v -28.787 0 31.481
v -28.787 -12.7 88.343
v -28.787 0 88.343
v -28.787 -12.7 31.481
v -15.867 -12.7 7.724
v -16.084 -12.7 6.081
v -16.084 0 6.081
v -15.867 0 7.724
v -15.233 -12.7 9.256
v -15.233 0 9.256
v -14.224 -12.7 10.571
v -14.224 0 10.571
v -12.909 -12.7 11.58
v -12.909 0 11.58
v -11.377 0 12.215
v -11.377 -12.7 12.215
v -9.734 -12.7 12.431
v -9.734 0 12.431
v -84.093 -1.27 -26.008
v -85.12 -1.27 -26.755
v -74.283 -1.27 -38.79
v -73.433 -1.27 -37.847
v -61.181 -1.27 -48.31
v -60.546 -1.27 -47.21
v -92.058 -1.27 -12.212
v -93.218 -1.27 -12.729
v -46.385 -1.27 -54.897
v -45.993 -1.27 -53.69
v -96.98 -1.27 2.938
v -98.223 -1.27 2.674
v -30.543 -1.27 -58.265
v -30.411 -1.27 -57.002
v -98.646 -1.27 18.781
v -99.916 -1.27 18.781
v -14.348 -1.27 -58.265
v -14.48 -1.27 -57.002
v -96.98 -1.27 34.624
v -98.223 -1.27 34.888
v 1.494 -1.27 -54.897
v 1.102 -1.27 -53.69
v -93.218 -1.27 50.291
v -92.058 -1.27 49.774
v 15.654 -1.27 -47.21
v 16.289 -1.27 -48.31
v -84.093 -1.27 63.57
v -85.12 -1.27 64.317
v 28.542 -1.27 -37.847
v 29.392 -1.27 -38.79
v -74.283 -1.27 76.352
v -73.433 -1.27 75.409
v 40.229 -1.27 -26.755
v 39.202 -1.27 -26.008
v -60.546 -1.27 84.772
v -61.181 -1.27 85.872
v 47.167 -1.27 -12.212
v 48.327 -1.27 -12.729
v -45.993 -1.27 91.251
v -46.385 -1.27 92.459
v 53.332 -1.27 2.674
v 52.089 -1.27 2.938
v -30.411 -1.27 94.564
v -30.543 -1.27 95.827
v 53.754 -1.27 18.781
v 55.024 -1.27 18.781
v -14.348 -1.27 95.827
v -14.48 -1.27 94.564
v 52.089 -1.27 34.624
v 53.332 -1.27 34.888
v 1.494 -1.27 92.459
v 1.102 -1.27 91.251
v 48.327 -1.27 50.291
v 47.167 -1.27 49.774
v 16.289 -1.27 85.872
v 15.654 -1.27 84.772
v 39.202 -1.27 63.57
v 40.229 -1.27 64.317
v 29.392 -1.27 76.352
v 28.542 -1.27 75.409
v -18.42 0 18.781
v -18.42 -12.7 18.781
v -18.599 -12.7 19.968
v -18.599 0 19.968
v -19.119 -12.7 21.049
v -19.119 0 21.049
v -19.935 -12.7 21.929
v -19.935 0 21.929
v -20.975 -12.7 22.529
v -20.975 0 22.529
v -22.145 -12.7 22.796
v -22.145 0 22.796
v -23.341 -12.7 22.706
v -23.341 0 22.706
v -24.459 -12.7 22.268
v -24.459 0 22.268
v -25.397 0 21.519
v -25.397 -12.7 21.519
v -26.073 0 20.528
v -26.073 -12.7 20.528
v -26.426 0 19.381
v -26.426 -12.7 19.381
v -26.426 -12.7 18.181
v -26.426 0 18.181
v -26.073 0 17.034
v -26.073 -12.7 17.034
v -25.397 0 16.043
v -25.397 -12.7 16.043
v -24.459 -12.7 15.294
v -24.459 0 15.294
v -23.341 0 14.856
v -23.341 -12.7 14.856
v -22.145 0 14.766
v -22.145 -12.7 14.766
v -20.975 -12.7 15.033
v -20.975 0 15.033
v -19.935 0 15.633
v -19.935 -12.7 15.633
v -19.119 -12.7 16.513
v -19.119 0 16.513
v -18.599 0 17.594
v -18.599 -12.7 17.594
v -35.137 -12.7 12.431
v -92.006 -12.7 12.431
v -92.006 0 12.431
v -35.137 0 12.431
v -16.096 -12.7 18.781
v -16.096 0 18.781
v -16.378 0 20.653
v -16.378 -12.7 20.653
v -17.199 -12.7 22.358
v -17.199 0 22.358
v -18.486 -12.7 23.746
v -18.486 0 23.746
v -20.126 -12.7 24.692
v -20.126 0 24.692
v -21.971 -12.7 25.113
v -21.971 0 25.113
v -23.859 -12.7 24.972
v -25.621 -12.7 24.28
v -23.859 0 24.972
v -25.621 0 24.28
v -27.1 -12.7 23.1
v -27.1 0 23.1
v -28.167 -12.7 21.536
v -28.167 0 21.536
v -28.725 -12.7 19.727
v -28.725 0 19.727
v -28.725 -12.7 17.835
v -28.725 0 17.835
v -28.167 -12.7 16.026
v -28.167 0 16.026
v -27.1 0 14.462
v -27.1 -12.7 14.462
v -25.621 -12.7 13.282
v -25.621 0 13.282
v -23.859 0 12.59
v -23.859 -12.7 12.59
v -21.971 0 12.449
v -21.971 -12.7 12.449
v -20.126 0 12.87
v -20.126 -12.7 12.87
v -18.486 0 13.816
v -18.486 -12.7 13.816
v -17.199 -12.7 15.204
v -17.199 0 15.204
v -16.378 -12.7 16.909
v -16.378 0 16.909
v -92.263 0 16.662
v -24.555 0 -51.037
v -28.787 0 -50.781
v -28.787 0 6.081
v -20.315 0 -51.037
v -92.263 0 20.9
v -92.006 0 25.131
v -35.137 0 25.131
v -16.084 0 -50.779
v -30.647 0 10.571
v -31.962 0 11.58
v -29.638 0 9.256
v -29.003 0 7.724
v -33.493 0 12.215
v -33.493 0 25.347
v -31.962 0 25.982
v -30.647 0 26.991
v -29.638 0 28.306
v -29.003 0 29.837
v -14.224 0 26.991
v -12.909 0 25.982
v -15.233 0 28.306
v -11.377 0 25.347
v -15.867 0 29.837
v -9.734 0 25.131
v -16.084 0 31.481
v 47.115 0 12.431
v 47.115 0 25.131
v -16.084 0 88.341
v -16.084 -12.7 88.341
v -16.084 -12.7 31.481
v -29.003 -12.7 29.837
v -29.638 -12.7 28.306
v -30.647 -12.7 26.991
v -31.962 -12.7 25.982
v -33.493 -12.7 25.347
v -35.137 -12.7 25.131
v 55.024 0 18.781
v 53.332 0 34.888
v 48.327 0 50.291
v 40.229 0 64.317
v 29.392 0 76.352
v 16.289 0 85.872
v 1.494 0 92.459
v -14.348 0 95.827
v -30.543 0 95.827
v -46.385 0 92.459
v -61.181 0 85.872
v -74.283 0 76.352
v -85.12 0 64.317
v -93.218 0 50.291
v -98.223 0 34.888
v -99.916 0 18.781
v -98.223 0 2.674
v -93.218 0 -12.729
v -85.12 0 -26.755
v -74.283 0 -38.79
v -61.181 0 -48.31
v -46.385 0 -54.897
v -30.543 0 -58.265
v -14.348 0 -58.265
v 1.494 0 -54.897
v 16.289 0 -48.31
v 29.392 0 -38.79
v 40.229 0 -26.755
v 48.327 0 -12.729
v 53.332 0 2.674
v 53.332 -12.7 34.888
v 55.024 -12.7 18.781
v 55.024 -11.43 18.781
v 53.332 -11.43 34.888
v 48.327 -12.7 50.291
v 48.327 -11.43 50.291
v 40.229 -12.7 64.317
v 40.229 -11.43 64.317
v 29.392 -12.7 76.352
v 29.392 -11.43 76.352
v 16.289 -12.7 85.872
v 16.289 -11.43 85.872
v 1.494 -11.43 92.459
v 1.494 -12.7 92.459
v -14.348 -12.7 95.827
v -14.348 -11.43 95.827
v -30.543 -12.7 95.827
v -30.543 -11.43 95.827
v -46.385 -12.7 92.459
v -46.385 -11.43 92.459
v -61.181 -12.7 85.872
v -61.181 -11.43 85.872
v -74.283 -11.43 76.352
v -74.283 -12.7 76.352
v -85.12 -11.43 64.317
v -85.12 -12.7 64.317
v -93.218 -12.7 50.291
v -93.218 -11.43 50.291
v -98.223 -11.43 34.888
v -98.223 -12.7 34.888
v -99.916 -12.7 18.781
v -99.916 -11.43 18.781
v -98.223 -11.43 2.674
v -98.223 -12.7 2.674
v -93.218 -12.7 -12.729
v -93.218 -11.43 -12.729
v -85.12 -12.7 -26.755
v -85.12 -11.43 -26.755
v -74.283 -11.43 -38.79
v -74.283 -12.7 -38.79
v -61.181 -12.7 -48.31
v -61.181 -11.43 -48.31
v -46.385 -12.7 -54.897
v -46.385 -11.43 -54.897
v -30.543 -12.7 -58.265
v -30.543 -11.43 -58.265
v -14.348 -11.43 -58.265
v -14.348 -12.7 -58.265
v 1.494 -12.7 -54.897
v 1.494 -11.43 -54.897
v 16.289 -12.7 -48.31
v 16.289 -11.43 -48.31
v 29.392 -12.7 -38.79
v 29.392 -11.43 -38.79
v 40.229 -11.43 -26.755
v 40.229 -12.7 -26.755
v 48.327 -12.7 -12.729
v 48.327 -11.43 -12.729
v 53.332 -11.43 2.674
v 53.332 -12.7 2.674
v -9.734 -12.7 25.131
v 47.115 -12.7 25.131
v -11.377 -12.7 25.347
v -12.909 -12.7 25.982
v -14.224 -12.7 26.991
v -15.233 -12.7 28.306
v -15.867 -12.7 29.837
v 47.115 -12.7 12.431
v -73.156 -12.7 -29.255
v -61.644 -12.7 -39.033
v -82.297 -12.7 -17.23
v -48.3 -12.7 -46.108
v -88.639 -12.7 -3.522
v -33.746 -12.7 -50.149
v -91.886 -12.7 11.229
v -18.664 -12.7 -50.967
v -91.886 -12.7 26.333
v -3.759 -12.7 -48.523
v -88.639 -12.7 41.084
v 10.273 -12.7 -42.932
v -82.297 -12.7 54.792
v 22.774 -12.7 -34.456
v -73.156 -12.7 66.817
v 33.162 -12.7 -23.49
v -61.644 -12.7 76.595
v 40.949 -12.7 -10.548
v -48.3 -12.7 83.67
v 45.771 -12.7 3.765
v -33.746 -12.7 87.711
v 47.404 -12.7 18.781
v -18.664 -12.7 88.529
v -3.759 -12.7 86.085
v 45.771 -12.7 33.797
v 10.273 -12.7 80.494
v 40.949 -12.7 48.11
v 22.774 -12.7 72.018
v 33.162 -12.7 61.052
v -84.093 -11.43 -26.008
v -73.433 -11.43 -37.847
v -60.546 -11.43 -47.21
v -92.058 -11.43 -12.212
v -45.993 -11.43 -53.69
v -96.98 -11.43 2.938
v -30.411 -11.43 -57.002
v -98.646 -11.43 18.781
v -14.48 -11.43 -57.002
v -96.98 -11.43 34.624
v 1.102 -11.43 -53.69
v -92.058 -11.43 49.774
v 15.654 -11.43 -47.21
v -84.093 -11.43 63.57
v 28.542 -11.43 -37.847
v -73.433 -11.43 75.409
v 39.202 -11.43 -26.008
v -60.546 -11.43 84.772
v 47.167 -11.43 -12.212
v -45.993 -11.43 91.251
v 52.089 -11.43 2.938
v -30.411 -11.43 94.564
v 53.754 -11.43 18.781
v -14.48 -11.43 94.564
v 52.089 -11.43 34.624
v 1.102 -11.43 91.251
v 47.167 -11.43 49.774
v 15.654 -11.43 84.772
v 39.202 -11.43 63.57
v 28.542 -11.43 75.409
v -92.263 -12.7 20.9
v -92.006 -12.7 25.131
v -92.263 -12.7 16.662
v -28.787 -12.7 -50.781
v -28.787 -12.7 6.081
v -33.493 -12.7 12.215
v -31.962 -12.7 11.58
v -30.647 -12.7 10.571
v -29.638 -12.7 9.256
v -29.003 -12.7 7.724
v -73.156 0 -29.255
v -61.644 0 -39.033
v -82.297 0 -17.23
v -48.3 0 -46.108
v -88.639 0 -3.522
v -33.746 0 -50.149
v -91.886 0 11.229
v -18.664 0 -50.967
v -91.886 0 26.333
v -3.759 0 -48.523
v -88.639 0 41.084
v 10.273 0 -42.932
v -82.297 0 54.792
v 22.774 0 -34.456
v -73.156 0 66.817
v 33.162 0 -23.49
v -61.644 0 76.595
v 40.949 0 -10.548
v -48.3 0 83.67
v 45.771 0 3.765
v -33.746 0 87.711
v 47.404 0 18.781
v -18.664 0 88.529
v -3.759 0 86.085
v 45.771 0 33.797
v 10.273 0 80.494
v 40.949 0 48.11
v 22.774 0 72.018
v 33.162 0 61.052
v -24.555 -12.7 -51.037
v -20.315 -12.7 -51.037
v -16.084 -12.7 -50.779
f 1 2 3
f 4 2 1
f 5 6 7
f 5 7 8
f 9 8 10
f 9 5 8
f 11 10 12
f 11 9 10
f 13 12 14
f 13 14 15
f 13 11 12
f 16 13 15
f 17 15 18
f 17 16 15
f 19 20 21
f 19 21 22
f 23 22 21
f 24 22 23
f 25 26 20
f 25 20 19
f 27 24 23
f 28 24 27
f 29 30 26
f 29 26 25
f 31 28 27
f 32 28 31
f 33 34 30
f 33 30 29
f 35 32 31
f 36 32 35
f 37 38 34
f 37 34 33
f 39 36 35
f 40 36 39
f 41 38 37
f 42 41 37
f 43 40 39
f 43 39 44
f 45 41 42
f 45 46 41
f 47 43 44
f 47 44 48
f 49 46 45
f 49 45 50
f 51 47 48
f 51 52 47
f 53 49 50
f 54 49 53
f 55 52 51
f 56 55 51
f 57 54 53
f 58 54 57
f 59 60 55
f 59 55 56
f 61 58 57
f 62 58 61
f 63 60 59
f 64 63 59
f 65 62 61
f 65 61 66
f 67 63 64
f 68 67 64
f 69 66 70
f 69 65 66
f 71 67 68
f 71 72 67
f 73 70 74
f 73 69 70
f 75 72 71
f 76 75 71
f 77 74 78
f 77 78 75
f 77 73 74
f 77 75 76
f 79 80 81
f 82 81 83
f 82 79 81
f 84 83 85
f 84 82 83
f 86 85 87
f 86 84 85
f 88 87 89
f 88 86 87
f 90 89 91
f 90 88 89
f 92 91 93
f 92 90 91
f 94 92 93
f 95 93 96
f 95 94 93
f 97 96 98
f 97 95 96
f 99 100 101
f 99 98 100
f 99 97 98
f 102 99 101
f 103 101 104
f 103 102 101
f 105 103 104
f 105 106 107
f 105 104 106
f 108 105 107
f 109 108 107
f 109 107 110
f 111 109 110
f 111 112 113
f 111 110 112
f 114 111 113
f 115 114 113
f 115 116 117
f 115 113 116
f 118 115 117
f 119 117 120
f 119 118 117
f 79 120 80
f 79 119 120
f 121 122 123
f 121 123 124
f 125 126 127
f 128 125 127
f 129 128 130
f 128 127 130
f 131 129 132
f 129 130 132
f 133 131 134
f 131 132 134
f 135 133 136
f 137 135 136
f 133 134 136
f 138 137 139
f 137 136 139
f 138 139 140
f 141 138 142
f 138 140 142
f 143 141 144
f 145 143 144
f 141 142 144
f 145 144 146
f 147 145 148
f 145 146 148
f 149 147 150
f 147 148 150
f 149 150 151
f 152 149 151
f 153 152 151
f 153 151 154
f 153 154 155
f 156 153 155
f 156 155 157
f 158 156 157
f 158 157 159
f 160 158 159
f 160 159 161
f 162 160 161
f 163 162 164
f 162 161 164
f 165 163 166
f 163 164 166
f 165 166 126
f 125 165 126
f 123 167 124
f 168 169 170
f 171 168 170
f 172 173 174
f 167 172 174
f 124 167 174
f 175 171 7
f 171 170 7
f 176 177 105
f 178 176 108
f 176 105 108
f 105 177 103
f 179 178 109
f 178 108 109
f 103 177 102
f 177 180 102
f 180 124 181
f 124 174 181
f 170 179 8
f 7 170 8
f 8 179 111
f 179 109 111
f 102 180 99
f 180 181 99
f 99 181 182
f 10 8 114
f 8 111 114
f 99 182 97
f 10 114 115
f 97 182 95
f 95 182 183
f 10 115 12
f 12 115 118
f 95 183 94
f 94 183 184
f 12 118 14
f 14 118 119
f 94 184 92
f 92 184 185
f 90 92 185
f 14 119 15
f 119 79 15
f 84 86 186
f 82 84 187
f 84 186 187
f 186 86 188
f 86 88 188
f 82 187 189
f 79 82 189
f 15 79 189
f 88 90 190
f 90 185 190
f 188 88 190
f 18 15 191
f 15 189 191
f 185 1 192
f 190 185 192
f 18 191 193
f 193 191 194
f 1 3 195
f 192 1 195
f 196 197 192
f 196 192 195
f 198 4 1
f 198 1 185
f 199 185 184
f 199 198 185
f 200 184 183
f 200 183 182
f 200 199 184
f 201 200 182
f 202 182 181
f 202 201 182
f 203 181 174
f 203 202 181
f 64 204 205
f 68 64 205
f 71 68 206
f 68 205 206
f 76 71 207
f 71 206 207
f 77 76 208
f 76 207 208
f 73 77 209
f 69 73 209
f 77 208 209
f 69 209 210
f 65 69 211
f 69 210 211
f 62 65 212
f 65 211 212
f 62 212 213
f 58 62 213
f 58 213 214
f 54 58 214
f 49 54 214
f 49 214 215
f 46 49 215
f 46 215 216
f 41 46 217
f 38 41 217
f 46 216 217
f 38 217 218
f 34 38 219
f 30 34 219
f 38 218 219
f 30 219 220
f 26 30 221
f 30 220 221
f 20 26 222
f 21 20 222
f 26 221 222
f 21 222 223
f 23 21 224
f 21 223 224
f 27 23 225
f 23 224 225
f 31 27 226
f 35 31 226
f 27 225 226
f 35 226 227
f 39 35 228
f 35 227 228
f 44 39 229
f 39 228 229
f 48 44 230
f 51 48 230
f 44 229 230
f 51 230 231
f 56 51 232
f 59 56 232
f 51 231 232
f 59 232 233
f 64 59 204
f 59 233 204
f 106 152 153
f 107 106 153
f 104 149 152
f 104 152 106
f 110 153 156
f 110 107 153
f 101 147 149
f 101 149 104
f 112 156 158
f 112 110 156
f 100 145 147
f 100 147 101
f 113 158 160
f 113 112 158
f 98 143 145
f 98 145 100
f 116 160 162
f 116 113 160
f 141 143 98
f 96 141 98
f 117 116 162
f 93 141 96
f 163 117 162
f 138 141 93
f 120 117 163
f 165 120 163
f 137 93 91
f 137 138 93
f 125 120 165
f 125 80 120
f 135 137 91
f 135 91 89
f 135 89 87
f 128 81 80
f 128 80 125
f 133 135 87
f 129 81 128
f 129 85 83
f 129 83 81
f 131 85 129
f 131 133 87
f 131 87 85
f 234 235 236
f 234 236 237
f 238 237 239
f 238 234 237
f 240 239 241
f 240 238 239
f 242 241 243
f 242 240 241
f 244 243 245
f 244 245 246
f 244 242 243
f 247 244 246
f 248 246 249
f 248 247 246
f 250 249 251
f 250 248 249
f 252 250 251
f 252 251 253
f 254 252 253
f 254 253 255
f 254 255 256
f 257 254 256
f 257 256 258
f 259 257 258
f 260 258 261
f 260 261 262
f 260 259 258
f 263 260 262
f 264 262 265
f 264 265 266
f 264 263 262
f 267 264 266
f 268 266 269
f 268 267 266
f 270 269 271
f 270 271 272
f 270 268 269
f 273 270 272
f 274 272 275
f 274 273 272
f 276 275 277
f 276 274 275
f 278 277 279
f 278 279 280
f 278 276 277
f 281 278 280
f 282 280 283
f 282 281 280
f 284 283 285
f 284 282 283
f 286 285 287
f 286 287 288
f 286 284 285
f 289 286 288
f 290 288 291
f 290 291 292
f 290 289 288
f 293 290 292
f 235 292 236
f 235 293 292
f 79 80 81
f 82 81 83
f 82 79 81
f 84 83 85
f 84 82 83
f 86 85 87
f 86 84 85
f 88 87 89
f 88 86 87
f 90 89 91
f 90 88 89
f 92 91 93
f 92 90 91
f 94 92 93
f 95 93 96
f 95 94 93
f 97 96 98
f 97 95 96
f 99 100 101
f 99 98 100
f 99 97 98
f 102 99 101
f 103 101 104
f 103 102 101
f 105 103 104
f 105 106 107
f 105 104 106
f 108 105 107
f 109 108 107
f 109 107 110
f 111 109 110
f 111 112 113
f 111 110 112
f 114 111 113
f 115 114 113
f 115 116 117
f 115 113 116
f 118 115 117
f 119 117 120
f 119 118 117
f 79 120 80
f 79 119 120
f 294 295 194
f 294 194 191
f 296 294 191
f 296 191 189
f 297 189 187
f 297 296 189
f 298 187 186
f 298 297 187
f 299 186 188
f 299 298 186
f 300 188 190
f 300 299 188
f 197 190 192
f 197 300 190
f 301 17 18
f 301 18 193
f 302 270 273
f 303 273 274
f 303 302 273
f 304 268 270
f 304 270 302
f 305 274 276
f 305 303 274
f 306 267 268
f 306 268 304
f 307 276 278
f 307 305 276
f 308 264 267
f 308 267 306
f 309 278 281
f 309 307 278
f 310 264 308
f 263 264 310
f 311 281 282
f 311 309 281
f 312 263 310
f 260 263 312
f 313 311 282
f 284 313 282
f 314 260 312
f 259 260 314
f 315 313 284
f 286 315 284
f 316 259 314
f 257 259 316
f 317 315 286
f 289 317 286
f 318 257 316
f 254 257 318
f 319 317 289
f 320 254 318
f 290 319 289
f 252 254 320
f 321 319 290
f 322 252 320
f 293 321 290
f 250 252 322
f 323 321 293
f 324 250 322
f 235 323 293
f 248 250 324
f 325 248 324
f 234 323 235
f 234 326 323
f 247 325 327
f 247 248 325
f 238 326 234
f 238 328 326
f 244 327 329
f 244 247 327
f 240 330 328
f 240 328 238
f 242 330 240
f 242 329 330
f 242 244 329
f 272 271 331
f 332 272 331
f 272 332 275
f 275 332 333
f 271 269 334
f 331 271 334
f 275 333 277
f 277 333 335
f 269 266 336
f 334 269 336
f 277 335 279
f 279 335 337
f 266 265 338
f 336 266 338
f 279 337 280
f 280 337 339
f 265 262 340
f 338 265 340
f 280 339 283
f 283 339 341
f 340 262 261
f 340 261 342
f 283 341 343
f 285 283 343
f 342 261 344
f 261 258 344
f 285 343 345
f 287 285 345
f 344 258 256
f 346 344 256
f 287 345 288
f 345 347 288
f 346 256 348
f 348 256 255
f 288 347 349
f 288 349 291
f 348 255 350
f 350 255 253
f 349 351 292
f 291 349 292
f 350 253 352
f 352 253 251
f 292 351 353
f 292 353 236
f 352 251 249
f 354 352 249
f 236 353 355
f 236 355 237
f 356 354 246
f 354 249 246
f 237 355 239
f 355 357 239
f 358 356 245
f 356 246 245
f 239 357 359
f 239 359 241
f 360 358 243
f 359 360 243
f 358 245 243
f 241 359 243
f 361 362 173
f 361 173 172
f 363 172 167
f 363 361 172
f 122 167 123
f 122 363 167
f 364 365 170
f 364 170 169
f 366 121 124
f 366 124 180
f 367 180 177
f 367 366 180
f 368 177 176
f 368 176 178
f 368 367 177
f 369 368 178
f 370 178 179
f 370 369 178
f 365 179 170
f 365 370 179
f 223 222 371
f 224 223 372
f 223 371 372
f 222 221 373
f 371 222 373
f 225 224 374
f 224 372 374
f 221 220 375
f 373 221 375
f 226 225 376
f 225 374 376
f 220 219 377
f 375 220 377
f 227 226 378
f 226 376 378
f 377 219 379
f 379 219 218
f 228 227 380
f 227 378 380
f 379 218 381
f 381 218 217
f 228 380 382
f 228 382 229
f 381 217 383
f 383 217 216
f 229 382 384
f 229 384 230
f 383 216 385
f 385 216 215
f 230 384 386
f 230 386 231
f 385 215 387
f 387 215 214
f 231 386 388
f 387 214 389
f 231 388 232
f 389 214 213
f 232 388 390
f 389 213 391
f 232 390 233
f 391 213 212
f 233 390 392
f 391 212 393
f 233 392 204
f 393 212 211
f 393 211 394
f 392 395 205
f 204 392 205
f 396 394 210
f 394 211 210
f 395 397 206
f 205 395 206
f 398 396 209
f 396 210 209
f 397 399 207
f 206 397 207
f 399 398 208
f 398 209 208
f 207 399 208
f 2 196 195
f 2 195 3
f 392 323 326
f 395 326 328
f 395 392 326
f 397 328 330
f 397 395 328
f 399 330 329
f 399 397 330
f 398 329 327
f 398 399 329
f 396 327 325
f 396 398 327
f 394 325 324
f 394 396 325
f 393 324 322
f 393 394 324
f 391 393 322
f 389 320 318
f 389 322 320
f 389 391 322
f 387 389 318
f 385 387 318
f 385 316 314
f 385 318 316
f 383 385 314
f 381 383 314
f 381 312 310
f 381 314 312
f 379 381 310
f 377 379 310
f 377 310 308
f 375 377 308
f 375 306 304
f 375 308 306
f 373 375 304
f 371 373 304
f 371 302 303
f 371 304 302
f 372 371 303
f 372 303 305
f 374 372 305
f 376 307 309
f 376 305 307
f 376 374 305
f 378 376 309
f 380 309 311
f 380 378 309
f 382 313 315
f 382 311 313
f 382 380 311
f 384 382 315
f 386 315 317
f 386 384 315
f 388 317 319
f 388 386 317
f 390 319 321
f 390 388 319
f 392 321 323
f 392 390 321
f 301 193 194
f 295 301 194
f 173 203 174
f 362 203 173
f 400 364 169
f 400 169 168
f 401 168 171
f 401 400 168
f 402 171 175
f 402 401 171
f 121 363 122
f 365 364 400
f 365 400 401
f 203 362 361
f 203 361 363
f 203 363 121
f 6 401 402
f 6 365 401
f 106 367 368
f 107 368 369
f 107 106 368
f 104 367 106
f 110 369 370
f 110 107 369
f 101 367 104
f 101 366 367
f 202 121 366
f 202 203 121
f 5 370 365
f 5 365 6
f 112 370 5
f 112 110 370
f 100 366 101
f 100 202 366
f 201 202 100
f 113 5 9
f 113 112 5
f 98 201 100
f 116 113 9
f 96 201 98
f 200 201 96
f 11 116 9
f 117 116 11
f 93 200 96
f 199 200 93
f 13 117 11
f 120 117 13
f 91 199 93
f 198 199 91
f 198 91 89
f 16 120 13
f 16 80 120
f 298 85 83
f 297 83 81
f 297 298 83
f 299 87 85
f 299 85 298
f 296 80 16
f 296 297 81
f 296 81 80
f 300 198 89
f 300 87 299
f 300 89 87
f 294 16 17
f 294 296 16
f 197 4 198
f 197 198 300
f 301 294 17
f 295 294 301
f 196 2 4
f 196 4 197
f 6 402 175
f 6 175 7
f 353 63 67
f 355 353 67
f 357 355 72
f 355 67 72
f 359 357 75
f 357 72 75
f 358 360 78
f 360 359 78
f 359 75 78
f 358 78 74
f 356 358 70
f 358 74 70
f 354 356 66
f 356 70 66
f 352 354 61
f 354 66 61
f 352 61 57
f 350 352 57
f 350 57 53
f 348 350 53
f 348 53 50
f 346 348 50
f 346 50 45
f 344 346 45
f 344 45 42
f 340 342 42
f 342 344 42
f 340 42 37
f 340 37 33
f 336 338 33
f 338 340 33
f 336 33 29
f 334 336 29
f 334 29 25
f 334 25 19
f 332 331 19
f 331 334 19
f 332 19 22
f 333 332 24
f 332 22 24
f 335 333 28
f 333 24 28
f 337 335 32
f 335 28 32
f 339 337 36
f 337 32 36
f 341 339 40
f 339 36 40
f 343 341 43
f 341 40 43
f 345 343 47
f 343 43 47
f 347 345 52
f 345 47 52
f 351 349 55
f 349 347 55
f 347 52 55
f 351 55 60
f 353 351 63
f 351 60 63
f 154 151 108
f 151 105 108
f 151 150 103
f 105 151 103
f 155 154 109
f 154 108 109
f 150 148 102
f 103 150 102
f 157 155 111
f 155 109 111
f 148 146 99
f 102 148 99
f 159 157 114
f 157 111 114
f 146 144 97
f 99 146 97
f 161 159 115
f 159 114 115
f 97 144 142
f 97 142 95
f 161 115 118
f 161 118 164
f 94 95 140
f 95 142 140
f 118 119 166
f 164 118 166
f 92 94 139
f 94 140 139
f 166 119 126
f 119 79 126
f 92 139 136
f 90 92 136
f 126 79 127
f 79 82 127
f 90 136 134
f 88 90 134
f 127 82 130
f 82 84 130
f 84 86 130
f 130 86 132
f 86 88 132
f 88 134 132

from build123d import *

# Parameters (mm, degrees)
F0_R      = 76.2
F2_DEPTH  = 12.7
F3_R      = 77.47
F4_DEPTH  = 1.27
F5_R      = 77.47
F6_DEPTH  = 1.27
F7_R      = 4.0259
F8_DEPTH  = 25.4
F1_R      = 69.85
F10_DEPTH = 25.4
F11_R     = 6.35
F12_DEPTH = 12.7
F13_DEPTH = 25.4
F15_DEPTH = 12.7
F16_DEPTH = 25.4


# Not quite as in the source:
# - the program builds the solid bodies; features that only make, move or delete a surface that nothing else refers to are left out


with BuildPart() as f2:
    # F0 (on Front) → F2 (new body)
    with BuildSketch(Plane.XZ):
        with Locations((-22.4455539137, 18.7809728086)):
            Circle(F0_R)
    extrude(amount=F2_DEPTH)

    # F3 (on face) → F4 (join)
    with BuildSketch(Plane.XZ.offset(12.7)):
        with Locations((-22.4455539137, 18.7809728086)):
            Circle(F3_R)
    extrude(amount=-F4_DEPTH)

    # F5 (on face) → F6 (join)
    with BuildSketch(Plane.XZ):
        with Locations((-22.4455539137, 18.7809728086)):
            Circle(F5_R)
    extrude(amount=F6_DEPTH)

    # F7 (on face) → F8 (cut)
    with BuildSketch(Plane.XZ):
        with Locations((-22.4455539137, 18.7809728086)):
            Circle(F7_R)
    extrude(amount=F8_DEPTH, mode=Mode.SUBTRACT)

    # F1 (on face) → F10 (cut)
    with BuildSketch(Plane.XZ):
        with Locations((-22.4455539137, 18.7809728086)):
            Circle(F1_R)
    extrude(amount=F10_DEPTH, mode=Mode.SUBTRACT)


with BuildPart() as f12:
    # F11 (on face) → F12 (new body)
    with BuildSketch(Plane.XZ):
        with Locations((-22.4455539137, 18.7809728086)):
            Circle(F11_R)
    extrude(amount=F12_DEPTH)

    # F7 (on face) → F13 (cut)
    with BuildSketch(Plane.XZ):
        with Locations((-22.4455539137, 18.7809728086)):
            Circle(F7_R)
    extrude(amount=F13_DEPTH, mode=Mode.SUBTRACT)


with BuildPart() as f15:
    # F14 (on face) → F15 (new body)
    with BuildSketch(Plane.XZ.offset(12.7)):
        with BuildLine():
            Line((-16.083676368, -50.7787067054), (-16.083676368, -44.7071496457))
            Line((-16.083676368, -44.7071496457), (-16.083676368, 6.0809728086))
            ThreePointArc((-16.083676368, 6.0809728086), (-14.2238044285, 10.5711008691), (-9.733676368, 12.4309728086))
            Line((-9.733676368, 12.4309728086), (47.1152108894, 12.4309728086))
            Line((47.1152108894, 12.4309728086), (47.1152108894, 25.1309728086))
            Line((47.1152108894, 25.1309728086), (-9.733676368, 25.1309728086))
            ThreePointArc((-9.733676368, 25.1309728086), (-14.2238044285, 26.9908447481), (-16.083676368, 31.4809728086))
            Line((-16.083676368, 31.4809728086), (-16.083676368, 82.2690952629))
            Line((-16.083676368, 82.2690952629), (-16.083676368, 88.3406523226))
            Line((-16.083676368, 88.3406523226), (-28.7868808955, 88.3425288012))
            Line((-28.7868808955, 88.3425288012), (-28.7868808955, 31.4809728086))
            ThreePointArc((-28.7868808955, 31.4809728086), (-30.646752835, 26.9908447481), (-35.1368808955, 25.1309728086))
            Line((-35.1368808955, 25.1309728086), (-92.0063187169, 25.1309728086))
            ThreePointArc((-92.0063187169, 25.1309728086), (-92.2955539137, 18.7809728086), (-92.0063187169, 12.4309728086))
            Line((-92.0063187169, 12.4309728086), (-35.1368808955, 12.4309728086))
            ThreePointArc((-35.1368808955, 12.4309728086), (-30.646752835, 10.5711008691), (-28.7868808955, 6.0809728086))
            Line((-28.7868808955, 6.0809728086), (-28.7868808955, -50.780583184))
            ThreePointArc((-28.7868808955, -50.780583184), (-22.4352358852, -51.0690264293), (-16.083676368, -50.7787067054))
        make_face()
    extrude(amount=-F15_DEPTH)

    # F7 (on face) → F16 (cut)
    with BuildSketch(Plane.XZ):
        with Locations((-22.4455539137, 18.7809728086)):
            Circle(F7_R)
    extrude(amount=F16_DEPTH, mode=Mode.SUBTRACT)


solid = Compound([f2.part, f12.part, f15.part])
